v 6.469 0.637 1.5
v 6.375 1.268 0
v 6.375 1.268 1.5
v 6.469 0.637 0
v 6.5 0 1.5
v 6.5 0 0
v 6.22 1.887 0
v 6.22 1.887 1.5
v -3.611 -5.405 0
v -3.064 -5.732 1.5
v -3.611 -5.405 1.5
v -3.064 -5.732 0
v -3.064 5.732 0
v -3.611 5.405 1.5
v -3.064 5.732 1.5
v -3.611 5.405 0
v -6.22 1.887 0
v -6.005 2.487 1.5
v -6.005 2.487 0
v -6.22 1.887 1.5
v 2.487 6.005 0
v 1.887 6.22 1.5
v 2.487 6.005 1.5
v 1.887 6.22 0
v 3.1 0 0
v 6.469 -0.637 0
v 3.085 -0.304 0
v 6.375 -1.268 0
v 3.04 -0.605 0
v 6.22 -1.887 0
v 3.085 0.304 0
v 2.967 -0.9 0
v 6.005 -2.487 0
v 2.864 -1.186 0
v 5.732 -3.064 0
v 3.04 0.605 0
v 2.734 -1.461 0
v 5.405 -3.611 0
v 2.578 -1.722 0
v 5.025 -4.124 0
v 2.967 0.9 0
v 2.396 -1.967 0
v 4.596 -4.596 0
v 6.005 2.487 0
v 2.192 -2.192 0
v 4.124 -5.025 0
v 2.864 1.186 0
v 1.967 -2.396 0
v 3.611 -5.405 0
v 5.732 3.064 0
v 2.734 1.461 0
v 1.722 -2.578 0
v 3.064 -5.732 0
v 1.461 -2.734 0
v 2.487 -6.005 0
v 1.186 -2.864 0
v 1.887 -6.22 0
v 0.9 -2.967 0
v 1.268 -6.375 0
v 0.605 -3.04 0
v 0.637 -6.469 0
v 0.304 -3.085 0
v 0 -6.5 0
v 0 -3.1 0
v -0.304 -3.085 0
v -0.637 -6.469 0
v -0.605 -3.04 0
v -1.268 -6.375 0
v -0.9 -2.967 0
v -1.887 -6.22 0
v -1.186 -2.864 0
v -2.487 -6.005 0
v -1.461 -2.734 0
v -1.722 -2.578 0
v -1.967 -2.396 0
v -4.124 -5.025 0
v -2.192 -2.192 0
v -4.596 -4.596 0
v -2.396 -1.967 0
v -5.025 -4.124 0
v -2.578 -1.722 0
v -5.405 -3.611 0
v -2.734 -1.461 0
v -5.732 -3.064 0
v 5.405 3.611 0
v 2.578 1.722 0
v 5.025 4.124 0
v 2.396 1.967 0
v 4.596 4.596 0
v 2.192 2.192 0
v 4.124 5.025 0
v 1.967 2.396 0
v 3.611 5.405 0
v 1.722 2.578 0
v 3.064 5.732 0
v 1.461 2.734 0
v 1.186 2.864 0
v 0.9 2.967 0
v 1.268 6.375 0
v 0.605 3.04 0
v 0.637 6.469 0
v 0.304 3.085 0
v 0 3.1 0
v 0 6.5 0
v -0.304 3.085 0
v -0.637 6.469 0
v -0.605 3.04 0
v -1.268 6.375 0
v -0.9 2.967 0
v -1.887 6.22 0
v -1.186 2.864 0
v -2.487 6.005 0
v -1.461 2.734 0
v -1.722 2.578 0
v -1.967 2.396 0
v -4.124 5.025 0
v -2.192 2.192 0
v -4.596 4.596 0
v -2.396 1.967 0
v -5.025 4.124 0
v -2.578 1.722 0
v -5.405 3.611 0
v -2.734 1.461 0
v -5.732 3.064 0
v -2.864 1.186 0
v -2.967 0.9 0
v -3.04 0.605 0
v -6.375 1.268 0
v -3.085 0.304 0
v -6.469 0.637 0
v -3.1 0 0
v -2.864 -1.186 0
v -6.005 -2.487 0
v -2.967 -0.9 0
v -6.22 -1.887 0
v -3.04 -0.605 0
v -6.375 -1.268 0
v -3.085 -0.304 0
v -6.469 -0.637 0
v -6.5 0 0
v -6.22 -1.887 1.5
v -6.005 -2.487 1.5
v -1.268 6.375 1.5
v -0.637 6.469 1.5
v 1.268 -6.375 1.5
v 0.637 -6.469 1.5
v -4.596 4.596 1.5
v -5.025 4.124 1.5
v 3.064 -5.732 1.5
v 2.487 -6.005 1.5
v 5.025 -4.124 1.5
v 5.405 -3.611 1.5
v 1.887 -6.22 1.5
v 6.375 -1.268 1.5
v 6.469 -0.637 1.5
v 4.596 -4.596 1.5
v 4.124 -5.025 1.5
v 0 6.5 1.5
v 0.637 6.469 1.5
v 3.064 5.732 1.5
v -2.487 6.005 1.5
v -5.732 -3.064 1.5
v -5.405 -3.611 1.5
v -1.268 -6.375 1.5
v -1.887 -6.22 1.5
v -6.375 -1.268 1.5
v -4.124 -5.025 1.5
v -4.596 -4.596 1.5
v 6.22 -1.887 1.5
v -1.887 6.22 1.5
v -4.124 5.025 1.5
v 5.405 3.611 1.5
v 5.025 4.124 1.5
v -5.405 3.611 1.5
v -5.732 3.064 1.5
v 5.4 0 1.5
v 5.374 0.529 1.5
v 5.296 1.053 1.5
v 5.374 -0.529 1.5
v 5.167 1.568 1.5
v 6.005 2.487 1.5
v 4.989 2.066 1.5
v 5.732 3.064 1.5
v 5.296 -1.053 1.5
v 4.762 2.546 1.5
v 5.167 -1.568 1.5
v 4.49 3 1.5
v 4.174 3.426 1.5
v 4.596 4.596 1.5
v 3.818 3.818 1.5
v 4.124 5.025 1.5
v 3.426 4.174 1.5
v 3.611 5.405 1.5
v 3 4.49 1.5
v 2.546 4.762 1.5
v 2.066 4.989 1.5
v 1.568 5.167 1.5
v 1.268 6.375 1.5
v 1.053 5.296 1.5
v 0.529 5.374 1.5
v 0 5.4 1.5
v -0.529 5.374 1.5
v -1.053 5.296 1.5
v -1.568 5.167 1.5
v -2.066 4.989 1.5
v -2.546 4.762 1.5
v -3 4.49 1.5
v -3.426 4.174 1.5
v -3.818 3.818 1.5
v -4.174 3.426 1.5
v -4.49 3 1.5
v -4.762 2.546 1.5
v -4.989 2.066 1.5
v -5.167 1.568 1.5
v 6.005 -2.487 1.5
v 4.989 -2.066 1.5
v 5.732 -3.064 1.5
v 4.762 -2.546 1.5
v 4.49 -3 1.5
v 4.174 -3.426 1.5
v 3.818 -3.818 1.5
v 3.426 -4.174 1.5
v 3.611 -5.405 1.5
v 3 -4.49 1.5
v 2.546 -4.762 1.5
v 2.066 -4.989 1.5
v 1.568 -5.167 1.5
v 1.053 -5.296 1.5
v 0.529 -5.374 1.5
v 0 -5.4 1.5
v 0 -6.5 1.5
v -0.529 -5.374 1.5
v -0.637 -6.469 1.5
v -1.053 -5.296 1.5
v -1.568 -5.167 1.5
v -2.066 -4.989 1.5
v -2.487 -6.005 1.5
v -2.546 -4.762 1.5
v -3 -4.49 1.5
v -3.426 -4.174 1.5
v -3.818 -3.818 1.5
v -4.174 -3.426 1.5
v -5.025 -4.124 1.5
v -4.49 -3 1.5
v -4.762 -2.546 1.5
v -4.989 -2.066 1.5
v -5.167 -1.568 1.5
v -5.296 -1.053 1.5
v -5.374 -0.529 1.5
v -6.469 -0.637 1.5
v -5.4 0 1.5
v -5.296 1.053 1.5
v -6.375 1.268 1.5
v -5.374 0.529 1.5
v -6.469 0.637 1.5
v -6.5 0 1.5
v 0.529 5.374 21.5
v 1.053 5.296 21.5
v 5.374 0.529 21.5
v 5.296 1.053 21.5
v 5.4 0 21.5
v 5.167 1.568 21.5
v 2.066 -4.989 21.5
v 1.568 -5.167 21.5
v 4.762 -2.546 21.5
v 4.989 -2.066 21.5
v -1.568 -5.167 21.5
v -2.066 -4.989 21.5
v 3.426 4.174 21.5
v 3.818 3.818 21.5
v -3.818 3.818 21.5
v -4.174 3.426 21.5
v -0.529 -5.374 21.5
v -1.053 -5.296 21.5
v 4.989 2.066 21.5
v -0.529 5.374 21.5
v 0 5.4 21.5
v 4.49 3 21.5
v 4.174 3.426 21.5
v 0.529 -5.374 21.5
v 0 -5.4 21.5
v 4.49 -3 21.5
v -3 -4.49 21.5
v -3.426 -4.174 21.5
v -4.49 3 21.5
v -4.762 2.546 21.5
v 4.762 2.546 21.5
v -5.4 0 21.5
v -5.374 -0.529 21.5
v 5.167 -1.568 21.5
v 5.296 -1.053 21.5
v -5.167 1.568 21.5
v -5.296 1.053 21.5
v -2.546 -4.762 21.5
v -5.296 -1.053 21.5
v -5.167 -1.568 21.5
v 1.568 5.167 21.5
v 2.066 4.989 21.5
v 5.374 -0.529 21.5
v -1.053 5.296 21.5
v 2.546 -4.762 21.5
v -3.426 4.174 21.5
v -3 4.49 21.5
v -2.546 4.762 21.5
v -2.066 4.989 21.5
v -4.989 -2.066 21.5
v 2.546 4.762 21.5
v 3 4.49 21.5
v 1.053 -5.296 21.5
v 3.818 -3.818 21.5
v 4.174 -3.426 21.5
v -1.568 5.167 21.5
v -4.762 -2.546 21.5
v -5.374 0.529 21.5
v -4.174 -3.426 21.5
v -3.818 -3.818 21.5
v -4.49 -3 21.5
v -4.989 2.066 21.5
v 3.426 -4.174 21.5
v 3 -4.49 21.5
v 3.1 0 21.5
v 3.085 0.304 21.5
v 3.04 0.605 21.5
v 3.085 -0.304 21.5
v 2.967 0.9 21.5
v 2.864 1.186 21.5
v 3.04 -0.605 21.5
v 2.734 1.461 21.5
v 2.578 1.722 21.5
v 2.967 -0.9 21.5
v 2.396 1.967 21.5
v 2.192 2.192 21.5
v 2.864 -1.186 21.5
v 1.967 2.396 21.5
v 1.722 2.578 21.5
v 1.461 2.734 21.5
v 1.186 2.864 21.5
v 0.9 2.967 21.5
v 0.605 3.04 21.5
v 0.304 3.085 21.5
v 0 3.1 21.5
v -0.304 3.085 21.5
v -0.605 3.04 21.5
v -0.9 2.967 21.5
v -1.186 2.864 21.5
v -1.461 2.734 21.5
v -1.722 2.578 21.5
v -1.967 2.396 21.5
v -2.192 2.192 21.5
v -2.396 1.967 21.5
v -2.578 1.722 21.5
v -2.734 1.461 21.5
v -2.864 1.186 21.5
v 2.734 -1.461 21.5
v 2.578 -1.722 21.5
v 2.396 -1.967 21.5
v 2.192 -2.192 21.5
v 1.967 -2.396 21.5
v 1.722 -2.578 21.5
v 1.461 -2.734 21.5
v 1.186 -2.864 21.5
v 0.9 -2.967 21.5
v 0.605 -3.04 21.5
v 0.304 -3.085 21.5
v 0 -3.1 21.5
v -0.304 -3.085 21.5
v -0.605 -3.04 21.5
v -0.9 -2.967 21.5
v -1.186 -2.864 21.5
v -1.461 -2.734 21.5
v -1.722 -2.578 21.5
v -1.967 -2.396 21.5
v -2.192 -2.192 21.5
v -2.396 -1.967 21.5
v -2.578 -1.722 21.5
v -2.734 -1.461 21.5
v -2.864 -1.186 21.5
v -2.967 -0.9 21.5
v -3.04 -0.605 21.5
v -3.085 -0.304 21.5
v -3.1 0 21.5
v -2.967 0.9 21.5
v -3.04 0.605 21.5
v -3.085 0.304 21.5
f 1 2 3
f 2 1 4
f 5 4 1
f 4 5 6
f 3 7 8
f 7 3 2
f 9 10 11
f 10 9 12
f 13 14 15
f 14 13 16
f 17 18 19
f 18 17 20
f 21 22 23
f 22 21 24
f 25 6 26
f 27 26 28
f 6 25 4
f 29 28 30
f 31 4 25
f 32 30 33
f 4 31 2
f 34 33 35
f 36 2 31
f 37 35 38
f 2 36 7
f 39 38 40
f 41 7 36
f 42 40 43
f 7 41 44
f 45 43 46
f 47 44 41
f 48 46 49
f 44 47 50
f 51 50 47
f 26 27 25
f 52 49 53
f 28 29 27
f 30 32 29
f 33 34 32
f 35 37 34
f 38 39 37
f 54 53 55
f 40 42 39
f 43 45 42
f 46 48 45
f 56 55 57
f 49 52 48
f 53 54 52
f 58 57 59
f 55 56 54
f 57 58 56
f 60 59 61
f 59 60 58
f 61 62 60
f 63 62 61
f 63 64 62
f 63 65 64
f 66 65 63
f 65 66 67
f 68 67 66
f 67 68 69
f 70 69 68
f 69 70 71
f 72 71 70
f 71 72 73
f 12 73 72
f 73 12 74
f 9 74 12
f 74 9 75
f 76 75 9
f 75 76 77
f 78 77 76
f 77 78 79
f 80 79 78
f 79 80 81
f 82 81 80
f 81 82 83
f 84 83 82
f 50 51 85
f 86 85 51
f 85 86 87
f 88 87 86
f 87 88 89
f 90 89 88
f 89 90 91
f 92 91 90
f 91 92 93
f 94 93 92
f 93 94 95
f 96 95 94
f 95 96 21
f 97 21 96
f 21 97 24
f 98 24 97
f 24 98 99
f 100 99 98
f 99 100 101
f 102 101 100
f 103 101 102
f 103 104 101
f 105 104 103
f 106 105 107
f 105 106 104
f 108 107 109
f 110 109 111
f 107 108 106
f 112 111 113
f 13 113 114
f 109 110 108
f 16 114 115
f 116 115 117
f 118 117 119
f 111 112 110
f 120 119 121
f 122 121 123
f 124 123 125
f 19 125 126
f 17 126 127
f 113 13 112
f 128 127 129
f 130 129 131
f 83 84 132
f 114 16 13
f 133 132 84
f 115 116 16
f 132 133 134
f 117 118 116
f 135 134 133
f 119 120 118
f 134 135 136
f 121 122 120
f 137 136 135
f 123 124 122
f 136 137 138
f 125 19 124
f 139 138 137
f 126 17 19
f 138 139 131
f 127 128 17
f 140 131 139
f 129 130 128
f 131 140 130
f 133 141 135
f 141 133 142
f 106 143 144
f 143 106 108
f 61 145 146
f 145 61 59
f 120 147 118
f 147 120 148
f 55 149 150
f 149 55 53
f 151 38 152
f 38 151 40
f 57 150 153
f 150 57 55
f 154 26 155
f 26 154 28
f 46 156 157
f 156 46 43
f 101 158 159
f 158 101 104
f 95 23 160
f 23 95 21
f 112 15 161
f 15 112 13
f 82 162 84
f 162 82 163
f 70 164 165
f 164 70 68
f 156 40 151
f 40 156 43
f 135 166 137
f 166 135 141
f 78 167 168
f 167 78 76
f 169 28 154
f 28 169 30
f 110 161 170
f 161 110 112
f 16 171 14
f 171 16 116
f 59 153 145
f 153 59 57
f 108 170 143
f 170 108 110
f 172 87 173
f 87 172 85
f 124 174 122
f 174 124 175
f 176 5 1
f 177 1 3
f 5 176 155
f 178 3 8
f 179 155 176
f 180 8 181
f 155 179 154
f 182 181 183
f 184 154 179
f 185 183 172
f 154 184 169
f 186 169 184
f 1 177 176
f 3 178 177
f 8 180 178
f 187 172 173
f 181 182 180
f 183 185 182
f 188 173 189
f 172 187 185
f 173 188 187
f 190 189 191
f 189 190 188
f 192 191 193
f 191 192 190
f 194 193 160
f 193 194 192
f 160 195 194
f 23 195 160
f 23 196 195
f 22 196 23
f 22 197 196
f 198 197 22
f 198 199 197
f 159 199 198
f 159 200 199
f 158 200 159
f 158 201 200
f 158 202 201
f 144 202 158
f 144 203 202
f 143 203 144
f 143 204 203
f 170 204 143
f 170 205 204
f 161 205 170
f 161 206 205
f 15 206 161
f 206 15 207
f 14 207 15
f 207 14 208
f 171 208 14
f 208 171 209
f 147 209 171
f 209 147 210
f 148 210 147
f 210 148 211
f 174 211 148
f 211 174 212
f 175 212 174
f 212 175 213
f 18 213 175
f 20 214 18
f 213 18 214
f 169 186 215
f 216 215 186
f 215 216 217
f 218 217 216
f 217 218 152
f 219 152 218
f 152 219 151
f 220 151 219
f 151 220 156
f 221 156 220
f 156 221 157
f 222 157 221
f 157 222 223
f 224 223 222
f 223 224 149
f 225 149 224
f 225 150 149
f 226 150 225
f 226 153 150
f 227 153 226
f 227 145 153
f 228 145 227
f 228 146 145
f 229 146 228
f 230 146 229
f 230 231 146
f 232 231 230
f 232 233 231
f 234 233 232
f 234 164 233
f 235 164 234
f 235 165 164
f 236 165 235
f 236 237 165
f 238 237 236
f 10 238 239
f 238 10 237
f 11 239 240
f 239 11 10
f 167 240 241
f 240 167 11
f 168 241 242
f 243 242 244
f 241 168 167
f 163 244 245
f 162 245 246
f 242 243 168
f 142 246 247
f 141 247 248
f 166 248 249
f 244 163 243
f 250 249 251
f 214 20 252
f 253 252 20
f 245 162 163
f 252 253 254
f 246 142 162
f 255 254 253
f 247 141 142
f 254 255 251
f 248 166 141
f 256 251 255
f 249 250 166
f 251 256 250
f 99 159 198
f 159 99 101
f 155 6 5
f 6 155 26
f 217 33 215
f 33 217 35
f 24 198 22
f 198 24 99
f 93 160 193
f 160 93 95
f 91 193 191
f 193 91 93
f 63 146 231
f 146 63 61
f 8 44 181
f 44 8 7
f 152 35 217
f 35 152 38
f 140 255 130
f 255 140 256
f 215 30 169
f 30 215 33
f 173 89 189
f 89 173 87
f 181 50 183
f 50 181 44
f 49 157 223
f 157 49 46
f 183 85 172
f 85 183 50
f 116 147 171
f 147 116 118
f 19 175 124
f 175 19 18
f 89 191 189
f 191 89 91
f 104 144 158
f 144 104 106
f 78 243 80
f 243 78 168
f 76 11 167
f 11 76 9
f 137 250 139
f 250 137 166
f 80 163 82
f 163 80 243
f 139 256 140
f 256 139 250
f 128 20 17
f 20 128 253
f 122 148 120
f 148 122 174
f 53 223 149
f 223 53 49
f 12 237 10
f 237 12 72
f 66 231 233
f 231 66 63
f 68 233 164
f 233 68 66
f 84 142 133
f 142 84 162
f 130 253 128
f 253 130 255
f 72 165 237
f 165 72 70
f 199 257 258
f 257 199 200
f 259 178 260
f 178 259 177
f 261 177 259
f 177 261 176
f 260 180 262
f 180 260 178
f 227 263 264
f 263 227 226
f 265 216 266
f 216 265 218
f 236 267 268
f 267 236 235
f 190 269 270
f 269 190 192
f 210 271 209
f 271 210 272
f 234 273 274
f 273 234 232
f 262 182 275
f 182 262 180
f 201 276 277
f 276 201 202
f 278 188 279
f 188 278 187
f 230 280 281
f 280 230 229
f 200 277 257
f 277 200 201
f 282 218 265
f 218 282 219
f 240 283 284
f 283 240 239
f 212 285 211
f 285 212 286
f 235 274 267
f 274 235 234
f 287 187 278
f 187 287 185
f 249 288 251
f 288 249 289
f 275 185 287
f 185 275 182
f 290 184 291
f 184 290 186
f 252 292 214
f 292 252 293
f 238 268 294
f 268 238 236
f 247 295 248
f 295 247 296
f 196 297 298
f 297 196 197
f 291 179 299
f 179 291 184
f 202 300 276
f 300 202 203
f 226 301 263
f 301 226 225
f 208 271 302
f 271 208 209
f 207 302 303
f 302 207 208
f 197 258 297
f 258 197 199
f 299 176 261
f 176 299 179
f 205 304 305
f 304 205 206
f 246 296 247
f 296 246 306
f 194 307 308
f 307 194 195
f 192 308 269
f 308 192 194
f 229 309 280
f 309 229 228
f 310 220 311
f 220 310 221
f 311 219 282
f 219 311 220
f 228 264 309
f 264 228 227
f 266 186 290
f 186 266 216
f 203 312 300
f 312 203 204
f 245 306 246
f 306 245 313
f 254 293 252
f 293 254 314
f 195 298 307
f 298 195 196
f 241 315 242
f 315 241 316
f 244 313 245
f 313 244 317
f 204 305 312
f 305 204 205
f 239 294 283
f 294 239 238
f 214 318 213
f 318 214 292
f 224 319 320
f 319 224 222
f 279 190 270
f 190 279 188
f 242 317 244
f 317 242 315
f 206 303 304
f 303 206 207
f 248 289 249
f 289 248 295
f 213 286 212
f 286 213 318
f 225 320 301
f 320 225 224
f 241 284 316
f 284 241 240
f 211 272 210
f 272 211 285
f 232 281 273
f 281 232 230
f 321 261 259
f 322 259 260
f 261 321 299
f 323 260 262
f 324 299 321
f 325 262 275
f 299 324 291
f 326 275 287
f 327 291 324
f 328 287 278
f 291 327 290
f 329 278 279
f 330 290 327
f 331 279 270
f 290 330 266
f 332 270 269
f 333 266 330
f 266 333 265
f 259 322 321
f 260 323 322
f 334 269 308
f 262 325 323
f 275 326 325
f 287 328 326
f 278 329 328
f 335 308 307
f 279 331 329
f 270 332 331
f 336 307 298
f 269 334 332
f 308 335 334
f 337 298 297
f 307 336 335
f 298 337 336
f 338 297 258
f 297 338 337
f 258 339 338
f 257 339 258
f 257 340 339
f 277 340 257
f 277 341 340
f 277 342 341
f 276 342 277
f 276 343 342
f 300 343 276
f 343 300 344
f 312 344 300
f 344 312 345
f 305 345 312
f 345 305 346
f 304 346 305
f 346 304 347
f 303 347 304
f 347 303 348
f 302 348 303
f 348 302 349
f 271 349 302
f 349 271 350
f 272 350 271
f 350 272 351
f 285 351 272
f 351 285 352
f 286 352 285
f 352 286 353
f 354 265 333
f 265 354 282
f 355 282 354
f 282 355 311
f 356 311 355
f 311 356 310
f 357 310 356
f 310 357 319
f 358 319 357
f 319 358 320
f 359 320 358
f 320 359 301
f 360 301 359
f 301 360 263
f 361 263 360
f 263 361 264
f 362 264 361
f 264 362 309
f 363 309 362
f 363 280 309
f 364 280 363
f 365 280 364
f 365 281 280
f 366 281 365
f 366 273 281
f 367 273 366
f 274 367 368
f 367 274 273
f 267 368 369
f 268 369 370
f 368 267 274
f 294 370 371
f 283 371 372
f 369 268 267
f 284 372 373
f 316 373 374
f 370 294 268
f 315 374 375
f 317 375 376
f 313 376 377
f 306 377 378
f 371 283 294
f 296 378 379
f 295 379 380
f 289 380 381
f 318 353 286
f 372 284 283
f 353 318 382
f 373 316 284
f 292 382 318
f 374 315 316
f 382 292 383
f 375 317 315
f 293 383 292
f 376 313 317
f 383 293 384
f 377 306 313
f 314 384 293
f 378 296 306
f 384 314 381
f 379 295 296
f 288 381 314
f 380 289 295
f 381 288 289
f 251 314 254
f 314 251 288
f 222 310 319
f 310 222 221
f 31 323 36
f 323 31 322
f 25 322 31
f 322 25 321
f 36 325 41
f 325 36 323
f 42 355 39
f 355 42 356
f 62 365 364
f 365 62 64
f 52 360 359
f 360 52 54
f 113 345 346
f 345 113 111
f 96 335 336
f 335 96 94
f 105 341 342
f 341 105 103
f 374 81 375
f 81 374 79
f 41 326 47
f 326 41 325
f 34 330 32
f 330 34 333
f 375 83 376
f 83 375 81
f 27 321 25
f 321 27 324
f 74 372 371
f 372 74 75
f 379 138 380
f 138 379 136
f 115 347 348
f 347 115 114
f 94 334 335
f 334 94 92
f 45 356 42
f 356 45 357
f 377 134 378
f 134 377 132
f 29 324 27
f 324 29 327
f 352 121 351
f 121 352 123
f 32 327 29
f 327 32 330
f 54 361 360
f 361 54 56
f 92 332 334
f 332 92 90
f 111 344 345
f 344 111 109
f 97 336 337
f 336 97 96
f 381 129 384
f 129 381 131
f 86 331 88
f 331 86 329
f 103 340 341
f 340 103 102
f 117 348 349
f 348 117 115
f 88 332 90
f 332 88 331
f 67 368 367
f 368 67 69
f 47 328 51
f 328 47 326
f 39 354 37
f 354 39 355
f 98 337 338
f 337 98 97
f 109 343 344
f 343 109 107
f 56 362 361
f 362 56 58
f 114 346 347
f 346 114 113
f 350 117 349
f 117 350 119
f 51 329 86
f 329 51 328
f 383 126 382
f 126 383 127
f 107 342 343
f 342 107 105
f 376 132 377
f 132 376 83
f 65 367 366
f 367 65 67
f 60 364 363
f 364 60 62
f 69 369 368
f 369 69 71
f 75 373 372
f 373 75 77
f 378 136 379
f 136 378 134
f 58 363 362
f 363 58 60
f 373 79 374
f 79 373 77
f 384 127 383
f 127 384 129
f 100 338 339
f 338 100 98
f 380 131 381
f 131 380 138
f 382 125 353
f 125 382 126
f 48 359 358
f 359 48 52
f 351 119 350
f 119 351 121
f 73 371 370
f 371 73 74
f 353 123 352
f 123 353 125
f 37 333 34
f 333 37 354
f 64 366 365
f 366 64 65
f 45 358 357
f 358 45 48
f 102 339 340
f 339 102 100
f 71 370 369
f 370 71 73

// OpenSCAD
// PCR tube adapter sleeve: prints upside down, collar on the bed (z = 0 to 1.5),
// sleeve body rises from the collar to z = 21.5. A 6.2 mm bore runs through the
// full height, open at both ends. Units: mm.
//

$fn = 64;

// ---- Dimensions ----
collar_d        = 13;     // collar outer diameter
collar_t        = 1.5;    // collar thickness (z = 0 to 1.5)
sleeve_d        = 10.8;   // sleeve body outer diameter
sleeve_top_z    = 21.5;   // top of sleeve body (absolute Z)
bore_d          = 6.2;    // through-bore diameter
eps             = 0.5;    // cutter overshoot past faces

// ---- Model ----
difference() {
    union() {
        // Collar lying on the bed, centred on the origin
        cylinder(d = collar_d, h = collar_t);

        // Sleeve body rising from the top of the collar
        translate([0, 0, collar_t])
            cylinder(d = sleeve_d, h = sleeve_top_z - collar_t);
    }

    // Straight bore through the full height, open at both ends
    translate([0, 0, -eps])
        cylinder(d = bore_d, h = sleeve_top_z + 2 * eps);
}
